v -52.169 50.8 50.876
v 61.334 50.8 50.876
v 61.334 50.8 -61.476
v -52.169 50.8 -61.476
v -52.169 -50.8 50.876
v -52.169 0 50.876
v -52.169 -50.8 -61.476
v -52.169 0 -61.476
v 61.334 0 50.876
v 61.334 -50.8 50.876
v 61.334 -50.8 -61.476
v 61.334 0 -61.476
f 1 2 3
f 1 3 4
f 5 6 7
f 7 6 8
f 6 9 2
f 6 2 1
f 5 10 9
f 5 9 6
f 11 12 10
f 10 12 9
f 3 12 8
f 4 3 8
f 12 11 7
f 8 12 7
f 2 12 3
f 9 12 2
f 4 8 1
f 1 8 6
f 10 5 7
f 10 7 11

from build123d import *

# Parameters (mm, degrees)
F1_DEPTH = 50.8
F2_W     = 113.503009
F2_H     = 112.352926
F3_DEPTH = 50.8


with BuildPart() as f1:
    # F0 (on Front) → F1 (new body)
    with BuildSketch(Plane.XZ):
        Polygon((61.334081, -61.476465), (61.334081, 0), (61.334081, 50.876461), (-52.168928, 50.876461), (-52.168928, -61.476465), align=None)
    extrude(amount=F1_DEPTH)

    # F2 (on face) → F3 (join)
    with BuildSketch(Plane(origin=(0, 0, 0), x_dir=(-1, 0, 0), z_dir=(0, 1, 0))):
        with Locations((-4.582576, -5.300002)):
            Rectangle(F2_W, F2_H)
    extrude(amount=F3_DEPTH)


solid = f1.part
